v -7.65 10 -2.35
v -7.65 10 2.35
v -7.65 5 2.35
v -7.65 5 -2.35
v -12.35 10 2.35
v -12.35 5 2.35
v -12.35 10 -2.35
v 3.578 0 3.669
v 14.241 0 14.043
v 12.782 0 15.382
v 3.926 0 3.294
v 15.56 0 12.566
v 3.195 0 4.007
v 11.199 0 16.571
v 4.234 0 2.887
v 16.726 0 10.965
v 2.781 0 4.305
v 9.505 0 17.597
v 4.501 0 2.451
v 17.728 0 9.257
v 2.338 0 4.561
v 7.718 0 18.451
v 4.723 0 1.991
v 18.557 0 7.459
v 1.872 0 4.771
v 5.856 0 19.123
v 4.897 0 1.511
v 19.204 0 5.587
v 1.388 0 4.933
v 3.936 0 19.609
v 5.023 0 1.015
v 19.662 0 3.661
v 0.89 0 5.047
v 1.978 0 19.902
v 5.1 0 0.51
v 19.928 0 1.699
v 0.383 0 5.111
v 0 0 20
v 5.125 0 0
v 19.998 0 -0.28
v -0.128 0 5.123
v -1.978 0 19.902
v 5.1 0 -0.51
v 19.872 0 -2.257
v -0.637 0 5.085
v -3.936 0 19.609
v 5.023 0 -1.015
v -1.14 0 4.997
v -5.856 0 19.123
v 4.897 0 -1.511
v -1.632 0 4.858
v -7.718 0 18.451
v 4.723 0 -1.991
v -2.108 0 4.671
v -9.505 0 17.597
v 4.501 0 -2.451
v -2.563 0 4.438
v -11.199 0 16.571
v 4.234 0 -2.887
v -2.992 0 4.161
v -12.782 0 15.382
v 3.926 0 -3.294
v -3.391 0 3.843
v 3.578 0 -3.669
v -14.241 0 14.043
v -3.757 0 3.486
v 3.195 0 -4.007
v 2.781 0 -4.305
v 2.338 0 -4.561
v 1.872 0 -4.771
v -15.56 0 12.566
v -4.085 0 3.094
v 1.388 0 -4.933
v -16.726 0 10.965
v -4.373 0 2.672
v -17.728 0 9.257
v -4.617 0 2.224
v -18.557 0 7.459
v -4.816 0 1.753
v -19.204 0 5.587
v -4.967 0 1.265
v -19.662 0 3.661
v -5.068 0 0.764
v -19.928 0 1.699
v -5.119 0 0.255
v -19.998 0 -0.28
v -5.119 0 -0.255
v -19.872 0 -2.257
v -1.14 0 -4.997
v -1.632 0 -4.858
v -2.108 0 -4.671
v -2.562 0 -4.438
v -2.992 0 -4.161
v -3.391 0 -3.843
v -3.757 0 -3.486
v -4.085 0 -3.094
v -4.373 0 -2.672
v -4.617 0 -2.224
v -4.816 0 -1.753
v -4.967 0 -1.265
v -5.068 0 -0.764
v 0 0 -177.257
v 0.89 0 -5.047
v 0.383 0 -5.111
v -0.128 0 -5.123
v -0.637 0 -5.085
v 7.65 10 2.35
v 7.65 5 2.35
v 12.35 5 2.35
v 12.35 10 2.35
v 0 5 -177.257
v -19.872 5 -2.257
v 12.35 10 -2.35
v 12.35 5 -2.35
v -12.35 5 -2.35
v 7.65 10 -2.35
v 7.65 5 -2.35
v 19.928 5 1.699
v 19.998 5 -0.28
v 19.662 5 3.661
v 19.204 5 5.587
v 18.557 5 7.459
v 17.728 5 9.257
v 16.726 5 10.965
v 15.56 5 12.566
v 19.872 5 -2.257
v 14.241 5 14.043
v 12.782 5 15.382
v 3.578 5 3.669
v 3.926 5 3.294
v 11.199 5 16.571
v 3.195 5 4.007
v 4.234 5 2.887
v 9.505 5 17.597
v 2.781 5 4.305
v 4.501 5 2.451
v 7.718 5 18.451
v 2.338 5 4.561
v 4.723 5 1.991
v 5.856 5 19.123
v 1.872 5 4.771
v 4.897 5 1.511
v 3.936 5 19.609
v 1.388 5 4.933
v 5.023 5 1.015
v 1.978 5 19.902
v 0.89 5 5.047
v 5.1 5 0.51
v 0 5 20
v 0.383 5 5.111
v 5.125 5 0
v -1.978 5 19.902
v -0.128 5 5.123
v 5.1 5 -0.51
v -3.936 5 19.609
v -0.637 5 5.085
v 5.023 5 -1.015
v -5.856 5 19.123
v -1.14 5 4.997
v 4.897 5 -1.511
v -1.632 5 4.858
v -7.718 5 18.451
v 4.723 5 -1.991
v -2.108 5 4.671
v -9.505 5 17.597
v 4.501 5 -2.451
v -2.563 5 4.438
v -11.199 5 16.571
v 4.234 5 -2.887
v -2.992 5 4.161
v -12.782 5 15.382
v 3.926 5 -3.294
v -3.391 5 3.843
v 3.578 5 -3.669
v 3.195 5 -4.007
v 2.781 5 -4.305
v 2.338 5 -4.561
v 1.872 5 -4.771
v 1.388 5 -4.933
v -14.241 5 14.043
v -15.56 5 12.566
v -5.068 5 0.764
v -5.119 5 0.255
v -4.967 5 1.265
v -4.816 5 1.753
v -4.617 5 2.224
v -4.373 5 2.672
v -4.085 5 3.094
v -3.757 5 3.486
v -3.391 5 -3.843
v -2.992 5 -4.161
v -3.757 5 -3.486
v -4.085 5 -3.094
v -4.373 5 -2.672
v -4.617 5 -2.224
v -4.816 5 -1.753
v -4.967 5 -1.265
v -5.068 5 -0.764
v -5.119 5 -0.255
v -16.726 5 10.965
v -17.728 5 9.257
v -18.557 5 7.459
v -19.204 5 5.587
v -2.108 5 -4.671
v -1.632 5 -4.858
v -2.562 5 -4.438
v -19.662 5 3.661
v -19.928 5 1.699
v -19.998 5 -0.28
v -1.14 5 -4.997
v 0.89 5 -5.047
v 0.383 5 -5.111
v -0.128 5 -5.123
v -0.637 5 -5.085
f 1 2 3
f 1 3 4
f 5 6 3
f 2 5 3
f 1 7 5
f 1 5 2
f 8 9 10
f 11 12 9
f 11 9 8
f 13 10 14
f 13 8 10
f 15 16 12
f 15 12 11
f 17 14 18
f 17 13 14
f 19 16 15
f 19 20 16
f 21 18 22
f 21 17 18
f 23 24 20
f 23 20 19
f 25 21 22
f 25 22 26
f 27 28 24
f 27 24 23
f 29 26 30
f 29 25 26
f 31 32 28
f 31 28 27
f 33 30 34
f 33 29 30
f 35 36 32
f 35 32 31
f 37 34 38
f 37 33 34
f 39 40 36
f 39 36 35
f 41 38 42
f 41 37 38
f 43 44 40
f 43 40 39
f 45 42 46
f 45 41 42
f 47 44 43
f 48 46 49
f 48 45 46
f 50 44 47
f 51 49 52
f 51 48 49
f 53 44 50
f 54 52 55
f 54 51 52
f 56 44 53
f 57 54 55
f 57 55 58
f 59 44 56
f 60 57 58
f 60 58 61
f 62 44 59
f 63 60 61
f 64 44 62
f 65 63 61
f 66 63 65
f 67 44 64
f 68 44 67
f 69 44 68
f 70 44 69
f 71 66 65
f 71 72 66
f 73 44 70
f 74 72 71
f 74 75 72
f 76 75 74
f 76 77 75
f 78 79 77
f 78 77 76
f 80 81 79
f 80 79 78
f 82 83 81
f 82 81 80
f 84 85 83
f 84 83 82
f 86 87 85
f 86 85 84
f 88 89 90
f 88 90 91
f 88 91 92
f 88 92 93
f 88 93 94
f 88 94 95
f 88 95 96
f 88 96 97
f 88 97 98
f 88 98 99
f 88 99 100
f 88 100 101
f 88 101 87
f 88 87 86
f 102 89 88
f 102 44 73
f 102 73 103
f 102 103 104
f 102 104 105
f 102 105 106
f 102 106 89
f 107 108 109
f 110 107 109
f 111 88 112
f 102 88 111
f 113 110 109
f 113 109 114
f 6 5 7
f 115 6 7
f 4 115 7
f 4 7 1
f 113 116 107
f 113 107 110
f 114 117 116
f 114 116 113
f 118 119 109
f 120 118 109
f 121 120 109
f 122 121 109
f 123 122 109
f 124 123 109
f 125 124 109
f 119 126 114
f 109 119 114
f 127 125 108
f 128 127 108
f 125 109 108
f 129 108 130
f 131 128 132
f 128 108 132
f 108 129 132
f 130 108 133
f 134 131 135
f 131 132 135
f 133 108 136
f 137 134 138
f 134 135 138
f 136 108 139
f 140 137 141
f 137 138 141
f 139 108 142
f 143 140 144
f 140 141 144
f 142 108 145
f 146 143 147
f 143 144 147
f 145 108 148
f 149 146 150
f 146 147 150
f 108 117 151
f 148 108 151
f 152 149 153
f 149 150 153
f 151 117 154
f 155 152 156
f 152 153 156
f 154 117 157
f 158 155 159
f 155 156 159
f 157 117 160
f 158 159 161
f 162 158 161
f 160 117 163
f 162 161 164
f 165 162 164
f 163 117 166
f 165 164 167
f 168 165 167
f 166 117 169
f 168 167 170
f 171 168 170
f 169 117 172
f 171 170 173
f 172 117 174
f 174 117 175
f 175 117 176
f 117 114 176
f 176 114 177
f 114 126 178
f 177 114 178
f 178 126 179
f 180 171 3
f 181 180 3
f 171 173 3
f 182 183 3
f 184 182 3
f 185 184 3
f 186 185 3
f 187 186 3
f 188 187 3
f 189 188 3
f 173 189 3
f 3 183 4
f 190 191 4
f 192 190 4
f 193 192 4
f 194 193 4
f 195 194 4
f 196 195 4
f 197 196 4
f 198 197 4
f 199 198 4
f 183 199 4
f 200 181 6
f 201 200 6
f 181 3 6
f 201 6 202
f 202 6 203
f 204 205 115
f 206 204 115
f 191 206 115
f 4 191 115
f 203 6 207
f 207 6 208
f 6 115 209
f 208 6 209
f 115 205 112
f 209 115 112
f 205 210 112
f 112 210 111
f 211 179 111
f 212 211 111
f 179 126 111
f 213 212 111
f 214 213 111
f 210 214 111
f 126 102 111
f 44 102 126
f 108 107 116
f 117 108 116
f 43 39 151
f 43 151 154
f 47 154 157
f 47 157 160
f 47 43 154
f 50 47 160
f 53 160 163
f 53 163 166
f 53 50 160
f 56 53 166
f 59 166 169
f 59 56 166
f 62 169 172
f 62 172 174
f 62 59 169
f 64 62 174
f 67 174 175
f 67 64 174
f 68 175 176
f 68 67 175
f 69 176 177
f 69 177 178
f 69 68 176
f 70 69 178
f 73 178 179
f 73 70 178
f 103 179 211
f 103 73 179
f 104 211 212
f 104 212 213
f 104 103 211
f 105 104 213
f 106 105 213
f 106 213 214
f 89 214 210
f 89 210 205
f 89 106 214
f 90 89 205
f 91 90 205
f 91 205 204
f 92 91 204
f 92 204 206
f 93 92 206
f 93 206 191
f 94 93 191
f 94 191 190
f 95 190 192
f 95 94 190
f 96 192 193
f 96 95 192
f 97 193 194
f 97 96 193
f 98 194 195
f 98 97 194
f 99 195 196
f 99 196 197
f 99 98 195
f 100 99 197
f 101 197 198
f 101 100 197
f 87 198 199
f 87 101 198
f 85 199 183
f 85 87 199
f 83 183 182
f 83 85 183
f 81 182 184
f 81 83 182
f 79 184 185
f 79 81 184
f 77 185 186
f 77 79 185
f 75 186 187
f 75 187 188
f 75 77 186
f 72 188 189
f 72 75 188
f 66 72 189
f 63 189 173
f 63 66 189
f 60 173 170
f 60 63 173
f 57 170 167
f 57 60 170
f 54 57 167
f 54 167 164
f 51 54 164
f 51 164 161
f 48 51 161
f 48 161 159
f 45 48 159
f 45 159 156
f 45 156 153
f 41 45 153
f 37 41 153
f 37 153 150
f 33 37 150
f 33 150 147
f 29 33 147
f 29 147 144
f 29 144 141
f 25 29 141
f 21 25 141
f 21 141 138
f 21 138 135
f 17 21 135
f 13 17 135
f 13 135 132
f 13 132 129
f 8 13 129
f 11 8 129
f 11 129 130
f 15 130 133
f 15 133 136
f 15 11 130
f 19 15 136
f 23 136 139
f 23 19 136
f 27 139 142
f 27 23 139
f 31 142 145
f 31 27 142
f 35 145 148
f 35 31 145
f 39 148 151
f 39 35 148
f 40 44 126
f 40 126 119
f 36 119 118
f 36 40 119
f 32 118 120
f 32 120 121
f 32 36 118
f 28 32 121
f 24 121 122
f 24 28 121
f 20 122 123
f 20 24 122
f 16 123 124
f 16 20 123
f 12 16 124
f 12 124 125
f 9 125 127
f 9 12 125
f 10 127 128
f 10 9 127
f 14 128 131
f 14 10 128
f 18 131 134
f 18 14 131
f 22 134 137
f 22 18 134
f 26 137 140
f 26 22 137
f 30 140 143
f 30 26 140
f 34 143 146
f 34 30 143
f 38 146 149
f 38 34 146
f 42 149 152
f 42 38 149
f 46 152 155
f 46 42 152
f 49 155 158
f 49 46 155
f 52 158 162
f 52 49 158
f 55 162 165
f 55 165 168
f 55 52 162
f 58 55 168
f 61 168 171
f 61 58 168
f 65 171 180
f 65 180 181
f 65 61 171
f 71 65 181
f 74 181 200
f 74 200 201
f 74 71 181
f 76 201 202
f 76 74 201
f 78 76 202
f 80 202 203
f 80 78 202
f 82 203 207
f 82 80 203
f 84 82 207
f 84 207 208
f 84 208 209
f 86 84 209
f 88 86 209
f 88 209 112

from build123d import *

# Parameters (mm, degrees)
SKETCH1_R           = 5.125
BOSS_EXTRUDE1_DEPTH = 5
SKETCH2_W           = 4.7
SKETCH2_H           = 4.7
BOSS_EXTRUDE2_DEPTH = 5


with BuildPart() as part:
    # Sketch1 → Boss-Extrude1 (new body)
    with BuildSketch(Plane(origin=(0, 0, 0), x_dir=(1, 0, 0), z_dir=(0, 1, 0))):
        with BuildLine():
            Line((-19.872284397, 2.256615355), (0, 177.256615355))
            Line((0, 177.256615355), (19.872284397, 2.256615355))
            ThreePointArc((19.872284397, 2.256615355), (0, -20), (-19.872284397, 2.256615355))
        make_face()
        Circle(SKETCH1_R, mode=Mode.SUBTRACT)
    extrude(amount=BOSS_EXTRUDE1_DEPTH)

    # Sketch2 → Boss-Extrude2 (add)
    with BuildSketch(Plane(origin=(0, 5, 0), x_dir=(1, 0, 0), z_dir=(0, 1, 0))):
        with Locations((10, 0)):
            Rectangle(SKETCH2_W, SKETCH2_H)
        with Locations((-10, 0)):
            Rectangle(SKETCH2_W, SKETCH2_H)
    extrude(amount=BOSS_EXTRUDE2_DEPTH)


solid = part.part
